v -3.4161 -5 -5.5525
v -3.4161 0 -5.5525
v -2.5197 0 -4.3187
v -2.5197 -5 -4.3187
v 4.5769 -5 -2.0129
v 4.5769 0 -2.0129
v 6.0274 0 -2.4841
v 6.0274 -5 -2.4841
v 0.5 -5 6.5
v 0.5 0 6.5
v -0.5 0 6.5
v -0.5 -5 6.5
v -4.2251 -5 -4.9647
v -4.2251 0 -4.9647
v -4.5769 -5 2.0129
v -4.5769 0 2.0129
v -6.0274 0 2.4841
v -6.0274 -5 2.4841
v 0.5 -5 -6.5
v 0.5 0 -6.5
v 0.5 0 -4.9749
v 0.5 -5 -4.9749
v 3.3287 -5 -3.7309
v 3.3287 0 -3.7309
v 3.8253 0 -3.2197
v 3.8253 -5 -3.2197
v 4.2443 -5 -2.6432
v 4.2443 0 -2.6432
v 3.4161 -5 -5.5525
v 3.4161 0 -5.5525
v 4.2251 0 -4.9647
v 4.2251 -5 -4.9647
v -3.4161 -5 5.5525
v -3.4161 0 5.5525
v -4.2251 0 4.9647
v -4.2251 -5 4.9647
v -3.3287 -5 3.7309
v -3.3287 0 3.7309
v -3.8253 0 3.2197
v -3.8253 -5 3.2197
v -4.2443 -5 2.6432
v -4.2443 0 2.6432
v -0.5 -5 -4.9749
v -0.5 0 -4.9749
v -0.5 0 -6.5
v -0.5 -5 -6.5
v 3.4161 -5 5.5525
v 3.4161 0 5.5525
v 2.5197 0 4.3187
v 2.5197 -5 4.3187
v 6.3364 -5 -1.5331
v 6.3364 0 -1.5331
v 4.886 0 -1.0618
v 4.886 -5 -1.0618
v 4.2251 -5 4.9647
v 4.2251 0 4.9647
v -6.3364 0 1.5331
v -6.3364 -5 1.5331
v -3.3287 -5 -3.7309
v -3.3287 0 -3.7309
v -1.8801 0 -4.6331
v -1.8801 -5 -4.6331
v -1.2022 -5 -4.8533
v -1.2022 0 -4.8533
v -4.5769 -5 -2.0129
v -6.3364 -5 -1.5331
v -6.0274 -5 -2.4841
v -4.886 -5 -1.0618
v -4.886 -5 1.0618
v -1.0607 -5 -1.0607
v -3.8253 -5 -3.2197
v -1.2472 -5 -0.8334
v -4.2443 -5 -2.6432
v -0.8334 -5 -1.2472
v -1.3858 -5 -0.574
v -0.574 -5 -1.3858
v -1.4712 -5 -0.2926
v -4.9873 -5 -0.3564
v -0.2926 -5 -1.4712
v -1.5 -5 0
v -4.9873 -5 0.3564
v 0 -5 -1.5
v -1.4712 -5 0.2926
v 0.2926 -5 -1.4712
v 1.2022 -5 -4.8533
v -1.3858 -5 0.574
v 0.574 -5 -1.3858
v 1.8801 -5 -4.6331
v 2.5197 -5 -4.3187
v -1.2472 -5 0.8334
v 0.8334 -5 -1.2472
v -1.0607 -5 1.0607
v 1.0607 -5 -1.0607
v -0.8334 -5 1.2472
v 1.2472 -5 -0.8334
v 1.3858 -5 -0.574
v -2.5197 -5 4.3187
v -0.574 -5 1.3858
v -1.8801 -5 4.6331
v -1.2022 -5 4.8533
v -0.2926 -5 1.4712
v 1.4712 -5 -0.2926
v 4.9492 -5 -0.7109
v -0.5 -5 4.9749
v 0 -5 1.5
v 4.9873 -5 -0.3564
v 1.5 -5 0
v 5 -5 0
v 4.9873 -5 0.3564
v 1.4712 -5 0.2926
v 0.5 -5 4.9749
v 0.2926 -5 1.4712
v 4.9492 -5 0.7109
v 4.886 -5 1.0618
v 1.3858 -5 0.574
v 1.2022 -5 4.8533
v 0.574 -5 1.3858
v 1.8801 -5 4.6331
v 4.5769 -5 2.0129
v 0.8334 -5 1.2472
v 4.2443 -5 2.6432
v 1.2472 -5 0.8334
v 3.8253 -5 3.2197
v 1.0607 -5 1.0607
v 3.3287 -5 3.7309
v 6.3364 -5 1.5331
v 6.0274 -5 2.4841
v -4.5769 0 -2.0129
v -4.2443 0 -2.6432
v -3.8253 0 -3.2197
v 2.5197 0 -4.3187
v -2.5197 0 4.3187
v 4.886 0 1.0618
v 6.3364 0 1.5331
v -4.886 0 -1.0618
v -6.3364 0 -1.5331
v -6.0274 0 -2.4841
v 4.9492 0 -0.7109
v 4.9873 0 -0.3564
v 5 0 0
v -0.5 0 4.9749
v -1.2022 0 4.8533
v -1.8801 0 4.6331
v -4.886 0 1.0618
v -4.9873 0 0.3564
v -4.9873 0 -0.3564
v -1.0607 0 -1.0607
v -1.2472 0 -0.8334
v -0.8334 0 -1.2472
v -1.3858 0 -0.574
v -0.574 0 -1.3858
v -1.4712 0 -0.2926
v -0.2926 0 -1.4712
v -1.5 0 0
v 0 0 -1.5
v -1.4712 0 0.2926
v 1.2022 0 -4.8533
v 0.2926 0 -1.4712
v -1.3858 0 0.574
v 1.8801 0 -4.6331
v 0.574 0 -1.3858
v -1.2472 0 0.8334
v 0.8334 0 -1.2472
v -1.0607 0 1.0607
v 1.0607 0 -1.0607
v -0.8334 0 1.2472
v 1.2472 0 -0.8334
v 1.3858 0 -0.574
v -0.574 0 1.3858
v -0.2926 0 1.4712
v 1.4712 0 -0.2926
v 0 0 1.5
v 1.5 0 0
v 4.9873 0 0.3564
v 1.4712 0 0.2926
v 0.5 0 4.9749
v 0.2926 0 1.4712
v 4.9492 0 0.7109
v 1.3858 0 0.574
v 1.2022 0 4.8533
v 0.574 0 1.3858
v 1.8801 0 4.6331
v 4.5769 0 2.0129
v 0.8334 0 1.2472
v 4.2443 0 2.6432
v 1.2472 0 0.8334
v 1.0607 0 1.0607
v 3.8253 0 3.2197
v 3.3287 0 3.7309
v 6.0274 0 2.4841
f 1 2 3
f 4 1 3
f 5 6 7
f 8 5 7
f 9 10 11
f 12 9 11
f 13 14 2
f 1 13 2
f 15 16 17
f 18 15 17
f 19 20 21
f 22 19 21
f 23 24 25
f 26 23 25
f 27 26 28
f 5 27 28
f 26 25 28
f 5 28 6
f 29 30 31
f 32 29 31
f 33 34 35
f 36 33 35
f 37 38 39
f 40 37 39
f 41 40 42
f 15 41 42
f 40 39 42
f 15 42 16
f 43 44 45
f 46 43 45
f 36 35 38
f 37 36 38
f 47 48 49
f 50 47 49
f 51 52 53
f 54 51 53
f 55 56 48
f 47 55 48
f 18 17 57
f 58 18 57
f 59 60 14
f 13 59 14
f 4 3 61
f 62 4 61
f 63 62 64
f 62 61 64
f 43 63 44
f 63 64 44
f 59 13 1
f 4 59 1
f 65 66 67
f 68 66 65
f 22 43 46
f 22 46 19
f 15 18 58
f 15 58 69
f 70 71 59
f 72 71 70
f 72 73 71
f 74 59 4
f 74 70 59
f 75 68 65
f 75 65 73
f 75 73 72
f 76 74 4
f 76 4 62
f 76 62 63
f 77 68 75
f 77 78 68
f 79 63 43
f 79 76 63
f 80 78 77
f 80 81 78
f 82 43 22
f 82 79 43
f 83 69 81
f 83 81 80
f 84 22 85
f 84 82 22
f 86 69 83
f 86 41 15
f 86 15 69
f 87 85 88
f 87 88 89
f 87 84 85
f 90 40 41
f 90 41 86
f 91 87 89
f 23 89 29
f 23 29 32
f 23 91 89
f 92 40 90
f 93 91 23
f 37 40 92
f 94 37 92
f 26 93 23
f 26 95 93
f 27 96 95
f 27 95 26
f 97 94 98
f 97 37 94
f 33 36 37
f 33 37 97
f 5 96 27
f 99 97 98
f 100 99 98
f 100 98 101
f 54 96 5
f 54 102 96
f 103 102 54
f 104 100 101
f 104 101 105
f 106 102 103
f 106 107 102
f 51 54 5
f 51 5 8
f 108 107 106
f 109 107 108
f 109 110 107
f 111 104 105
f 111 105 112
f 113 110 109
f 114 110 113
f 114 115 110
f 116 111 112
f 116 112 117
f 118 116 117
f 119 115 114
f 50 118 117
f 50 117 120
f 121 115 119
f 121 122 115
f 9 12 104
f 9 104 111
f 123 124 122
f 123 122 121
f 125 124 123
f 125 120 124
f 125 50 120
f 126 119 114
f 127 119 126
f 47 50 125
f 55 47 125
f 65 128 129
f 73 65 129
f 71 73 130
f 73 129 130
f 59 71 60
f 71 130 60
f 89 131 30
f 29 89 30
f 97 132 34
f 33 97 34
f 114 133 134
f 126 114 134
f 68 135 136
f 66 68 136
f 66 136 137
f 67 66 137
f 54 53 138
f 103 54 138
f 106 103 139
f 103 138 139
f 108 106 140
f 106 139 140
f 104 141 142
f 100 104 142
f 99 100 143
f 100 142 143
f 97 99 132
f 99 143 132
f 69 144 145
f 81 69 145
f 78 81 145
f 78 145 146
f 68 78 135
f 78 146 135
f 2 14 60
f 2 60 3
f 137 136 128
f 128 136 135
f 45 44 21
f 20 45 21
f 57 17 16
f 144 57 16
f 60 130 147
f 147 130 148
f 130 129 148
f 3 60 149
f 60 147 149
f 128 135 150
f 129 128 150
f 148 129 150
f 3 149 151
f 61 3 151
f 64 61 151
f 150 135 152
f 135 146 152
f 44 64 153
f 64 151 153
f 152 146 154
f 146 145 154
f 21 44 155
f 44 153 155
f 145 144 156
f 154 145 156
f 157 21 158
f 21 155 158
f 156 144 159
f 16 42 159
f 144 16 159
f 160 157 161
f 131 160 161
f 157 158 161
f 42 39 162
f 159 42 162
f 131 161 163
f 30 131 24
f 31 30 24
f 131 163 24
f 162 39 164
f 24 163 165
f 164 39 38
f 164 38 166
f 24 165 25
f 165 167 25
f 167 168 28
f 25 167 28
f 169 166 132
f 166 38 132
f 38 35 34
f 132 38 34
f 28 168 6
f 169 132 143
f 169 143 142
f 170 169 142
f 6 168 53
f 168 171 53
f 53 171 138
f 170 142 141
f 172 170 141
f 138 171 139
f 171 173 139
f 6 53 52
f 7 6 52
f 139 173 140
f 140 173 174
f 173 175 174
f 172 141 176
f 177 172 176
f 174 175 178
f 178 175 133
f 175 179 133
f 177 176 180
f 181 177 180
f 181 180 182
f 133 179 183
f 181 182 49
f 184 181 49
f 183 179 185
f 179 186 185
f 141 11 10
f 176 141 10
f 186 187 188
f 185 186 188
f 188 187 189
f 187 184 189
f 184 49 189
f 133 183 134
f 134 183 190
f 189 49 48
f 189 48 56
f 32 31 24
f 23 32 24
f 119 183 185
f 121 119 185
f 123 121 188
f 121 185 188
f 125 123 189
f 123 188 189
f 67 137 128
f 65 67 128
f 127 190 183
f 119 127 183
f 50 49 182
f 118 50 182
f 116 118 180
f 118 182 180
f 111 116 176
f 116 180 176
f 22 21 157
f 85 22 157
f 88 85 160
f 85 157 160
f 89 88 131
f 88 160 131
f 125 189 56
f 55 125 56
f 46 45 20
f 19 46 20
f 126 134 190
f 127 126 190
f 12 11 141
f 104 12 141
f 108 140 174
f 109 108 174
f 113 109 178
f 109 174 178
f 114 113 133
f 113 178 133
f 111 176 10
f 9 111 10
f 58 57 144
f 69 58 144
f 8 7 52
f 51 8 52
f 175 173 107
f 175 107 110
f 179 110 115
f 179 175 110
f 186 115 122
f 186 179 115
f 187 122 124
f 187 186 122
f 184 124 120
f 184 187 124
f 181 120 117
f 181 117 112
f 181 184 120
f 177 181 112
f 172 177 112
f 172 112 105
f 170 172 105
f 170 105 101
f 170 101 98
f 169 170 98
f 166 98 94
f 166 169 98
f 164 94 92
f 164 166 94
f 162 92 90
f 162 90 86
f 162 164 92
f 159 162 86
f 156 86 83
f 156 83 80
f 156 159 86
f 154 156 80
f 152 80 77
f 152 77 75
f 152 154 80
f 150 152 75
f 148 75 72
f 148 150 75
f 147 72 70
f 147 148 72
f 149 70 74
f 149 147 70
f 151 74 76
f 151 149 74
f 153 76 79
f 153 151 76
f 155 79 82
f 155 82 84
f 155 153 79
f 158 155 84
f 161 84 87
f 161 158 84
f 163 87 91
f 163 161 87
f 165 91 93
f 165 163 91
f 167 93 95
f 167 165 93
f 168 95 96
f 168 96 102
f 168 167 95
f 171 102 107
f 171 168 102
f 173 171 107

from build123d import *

# Parameters (mm, degrees)
F0_R     = 1.5
F1_DEPTH = 5


with BuildPart() as f1:
    # F0 (on Front) → F1 (new body)
    with BuildSketch(Plane.XZ):
        with BuildLine():
            ThreePointArc((4.885955, -1.061812), (4.971407, -0.533959), (5, 0))
            ThreePointArc((5, 0), (4.971407, 0.533959), (4.885955, 1.061812))
            ThreePointArc((4.885955, 1.061812), (4.755283, 1.545085), (4.576938, 2.012868))
            ThreePointArc((4.576938, 2.012868), (4.045085, 2.938926), (3.328703, 3.730916))
            ThreePointArc((3.328703, 3.730916), (2.938926, 4.045085), (2.519686, 4.318701))
            ThreePointArc((2.519686, 4.318701), (1.545085, 4.755283), (0.5, 4.974937))
            ThreePointArc((0.5, 4.974937), (0, 5), (-0.5, 4.974937))
            ThreePointArc((-0.5, 4.974937), (-1.545085, 4.755283), (-2.519686, 4.318701))
            ThreePointArc((-2.519686, 4.318701), (-2.938926, 4.045085), (-3.328703, 3.730916))
            ThreePointArc((-3.328703, 3.730916), (-4.045085, 2.938926), (-4.576938, 2.012868))
            ThreePointArc((-4.576938, 2.012868), (-4.755283, 1.545085), (-4.885955, 1.061812))
            ThreePointArc((-4.885955, 1.061812), (-5, 0), (-4.885955, -1.061812))
            ThreePointArc((-4.885955, -1.061812), (-4.755283, -1.545085), (-4.576938, -2.012868))
            ThreePointArc((-4.576938, -2.012868), (-4.045085, -2.938926), (-3.328703, -3.730916))
            ThreePointArc((-3.328703, -3.730916), (-2.938926, -4.045085), (-2.519686, -4.318701))
            ThreePointArc((-2.519686, -4.318701), (-1.545085, -4.755283), (-0.5, -4.974937))
            ThreePointArc((-0.5, -4.974937), (0, -5), (0.5, -4.974937))
            ThreePointArc((0.5, -4.974937), (1.545085, -4.755283), (2.519686, -4.318701))
            ThreePointArc((2.519686, -4.318701), (2.938926, -4.045085), (3.328703, -3.730916))
            ThreePointArc((3.328703, -3.730916), (4.045085, -2.938926), (4.576938, -2.012868))
            ThreePointArc((4.576938, -2.012868), (4.755283, -1.545085), (4.885955, -1.061812))
        make_face()
        Circle(F0_R, mode=Mode.SUBTRACT)
        with BuildLine():
            ThreePointArc((4.576938, 2.012868), (4.755283, 1.545085), (4.885955, 1.061812))
            Line((4.885955, 1.061812), (6.336376, 1.533082))
            Line((6.336376, 1.533082), (6.027359, 2.484139))
            Line((6.027359, 2.484139), (4.576938, 2.012868))
        make_face()
        with BuildLine():
            Line((6.336376, -1.533082), (4.885955, -1.061812))
            ThreePointArc((4.885955, -1.061812), (4.755283, -1.545085), (4.576938, -2.012868))
            Line((4.576938, -2.012868), (6.027359, -2.484139))
            Line((6.027359, -2.484139), (6.336376, -1.533082))
        make_face()
        with BuildLine():
            ThreePointArc((2.519686, 4.318701), (2.938926, 4.045085), (3.328703, 3.730916))
            Line((3.328703, 3.730916), (4.225113, 4.964718))
            Line((4.225113, 4.964718), (3.416096, 5.552503))
            Line((3.416096, 5.552503), (2.519686, 4.318701))
        make_face()
        with BuildLine():
            Line((4.225113, -4.964718), (3.328703, -3.730916))
            ThreePointArc((3.328703, -3.730916), (2.938926, -4.045085), (2.519686, -4.318701))
            Line((2.519686, -4.318701), (3.416096, -5.552503))
            Line((3.416096, -5.552503), (4.225113, -4.964718))
        make_face()
        with BuildLine():
            ThreePointArc((-0.5, 4.974937), (0, 5), (0.5, 4.974937))
            Line((0.5, 4.974937), (0.5, 6.5))
            Line((0.5, 6.5), (-0.5, 6.5))
            Line((-0.5, 6.5), (-0.5, 4.974937))
        make_face()
        with BuildLine():
            Line((0.5, -6.5), (0.5, -4.974937))
            ThreePointArc((0.5, -4.974937), (0, -5), (-0.5, -4.974937))
            Line((-0.5, -4.974937), (-0.5, -6.5))
            Line((-0.5, -6.5), (0.5, -6.5))
        make_face()
        with BuildLine():
            ThreePointArc((-3.328703, 3.730916), (-2.938926, 4.045085), (-2.519686, 4.318701))
            Line((-2.519686, 4.318701), (-3.416096, 5.552503))
            Line((-3.416096, 5.552503), (-4.225113, 4.964718))
            Line((-4.225113, 4.964718), (-3.328703, 3.730916))
        make_face()
        with BuildLine():
            Line((-3.416096, -5.552503), (-2.519686, -4.318701))
            ThreePointArc((-2.519686, -4.318701), (-2.938926, -4.045085), (-3.328703, -3.730916))
            Line((-3.328703, -3.730916), (-4.225113, -4.964718))
            Line((-4.225113, -4.964718), (-3.416096, -5.552503))
        make_face()
        with BuildLine():
            ThreePointArc((-4.885955, 1.061812), (-4.755283, 1.545085), (-4.576938, 2.012868))
            Line((-4.576938, 2.012868), (-6.027359, 2.484139))
            Line((-6.027359, 2.484139), (-6.336376, 1.533082))
            Line((-6.336376, 1.533082), (-4.885955, 1.061812))
        make_face()
        with BuildLine():
            Line((-6.027359, -2.484139), (-4.576938, -2.012868))
            ThreePointArc((-4.576938, -2.012868), (-4.755283, -1.545085), (-4.885955, -1.061812))
            Line((-4.885955, -1.061812), (-6.336376, -1.533082))
            Line((-6.336376, -1.533082), (-6.027359, -2.484139))
        make_face()
    extrude(amount=F1_DEPTH)


solid = f1.part
